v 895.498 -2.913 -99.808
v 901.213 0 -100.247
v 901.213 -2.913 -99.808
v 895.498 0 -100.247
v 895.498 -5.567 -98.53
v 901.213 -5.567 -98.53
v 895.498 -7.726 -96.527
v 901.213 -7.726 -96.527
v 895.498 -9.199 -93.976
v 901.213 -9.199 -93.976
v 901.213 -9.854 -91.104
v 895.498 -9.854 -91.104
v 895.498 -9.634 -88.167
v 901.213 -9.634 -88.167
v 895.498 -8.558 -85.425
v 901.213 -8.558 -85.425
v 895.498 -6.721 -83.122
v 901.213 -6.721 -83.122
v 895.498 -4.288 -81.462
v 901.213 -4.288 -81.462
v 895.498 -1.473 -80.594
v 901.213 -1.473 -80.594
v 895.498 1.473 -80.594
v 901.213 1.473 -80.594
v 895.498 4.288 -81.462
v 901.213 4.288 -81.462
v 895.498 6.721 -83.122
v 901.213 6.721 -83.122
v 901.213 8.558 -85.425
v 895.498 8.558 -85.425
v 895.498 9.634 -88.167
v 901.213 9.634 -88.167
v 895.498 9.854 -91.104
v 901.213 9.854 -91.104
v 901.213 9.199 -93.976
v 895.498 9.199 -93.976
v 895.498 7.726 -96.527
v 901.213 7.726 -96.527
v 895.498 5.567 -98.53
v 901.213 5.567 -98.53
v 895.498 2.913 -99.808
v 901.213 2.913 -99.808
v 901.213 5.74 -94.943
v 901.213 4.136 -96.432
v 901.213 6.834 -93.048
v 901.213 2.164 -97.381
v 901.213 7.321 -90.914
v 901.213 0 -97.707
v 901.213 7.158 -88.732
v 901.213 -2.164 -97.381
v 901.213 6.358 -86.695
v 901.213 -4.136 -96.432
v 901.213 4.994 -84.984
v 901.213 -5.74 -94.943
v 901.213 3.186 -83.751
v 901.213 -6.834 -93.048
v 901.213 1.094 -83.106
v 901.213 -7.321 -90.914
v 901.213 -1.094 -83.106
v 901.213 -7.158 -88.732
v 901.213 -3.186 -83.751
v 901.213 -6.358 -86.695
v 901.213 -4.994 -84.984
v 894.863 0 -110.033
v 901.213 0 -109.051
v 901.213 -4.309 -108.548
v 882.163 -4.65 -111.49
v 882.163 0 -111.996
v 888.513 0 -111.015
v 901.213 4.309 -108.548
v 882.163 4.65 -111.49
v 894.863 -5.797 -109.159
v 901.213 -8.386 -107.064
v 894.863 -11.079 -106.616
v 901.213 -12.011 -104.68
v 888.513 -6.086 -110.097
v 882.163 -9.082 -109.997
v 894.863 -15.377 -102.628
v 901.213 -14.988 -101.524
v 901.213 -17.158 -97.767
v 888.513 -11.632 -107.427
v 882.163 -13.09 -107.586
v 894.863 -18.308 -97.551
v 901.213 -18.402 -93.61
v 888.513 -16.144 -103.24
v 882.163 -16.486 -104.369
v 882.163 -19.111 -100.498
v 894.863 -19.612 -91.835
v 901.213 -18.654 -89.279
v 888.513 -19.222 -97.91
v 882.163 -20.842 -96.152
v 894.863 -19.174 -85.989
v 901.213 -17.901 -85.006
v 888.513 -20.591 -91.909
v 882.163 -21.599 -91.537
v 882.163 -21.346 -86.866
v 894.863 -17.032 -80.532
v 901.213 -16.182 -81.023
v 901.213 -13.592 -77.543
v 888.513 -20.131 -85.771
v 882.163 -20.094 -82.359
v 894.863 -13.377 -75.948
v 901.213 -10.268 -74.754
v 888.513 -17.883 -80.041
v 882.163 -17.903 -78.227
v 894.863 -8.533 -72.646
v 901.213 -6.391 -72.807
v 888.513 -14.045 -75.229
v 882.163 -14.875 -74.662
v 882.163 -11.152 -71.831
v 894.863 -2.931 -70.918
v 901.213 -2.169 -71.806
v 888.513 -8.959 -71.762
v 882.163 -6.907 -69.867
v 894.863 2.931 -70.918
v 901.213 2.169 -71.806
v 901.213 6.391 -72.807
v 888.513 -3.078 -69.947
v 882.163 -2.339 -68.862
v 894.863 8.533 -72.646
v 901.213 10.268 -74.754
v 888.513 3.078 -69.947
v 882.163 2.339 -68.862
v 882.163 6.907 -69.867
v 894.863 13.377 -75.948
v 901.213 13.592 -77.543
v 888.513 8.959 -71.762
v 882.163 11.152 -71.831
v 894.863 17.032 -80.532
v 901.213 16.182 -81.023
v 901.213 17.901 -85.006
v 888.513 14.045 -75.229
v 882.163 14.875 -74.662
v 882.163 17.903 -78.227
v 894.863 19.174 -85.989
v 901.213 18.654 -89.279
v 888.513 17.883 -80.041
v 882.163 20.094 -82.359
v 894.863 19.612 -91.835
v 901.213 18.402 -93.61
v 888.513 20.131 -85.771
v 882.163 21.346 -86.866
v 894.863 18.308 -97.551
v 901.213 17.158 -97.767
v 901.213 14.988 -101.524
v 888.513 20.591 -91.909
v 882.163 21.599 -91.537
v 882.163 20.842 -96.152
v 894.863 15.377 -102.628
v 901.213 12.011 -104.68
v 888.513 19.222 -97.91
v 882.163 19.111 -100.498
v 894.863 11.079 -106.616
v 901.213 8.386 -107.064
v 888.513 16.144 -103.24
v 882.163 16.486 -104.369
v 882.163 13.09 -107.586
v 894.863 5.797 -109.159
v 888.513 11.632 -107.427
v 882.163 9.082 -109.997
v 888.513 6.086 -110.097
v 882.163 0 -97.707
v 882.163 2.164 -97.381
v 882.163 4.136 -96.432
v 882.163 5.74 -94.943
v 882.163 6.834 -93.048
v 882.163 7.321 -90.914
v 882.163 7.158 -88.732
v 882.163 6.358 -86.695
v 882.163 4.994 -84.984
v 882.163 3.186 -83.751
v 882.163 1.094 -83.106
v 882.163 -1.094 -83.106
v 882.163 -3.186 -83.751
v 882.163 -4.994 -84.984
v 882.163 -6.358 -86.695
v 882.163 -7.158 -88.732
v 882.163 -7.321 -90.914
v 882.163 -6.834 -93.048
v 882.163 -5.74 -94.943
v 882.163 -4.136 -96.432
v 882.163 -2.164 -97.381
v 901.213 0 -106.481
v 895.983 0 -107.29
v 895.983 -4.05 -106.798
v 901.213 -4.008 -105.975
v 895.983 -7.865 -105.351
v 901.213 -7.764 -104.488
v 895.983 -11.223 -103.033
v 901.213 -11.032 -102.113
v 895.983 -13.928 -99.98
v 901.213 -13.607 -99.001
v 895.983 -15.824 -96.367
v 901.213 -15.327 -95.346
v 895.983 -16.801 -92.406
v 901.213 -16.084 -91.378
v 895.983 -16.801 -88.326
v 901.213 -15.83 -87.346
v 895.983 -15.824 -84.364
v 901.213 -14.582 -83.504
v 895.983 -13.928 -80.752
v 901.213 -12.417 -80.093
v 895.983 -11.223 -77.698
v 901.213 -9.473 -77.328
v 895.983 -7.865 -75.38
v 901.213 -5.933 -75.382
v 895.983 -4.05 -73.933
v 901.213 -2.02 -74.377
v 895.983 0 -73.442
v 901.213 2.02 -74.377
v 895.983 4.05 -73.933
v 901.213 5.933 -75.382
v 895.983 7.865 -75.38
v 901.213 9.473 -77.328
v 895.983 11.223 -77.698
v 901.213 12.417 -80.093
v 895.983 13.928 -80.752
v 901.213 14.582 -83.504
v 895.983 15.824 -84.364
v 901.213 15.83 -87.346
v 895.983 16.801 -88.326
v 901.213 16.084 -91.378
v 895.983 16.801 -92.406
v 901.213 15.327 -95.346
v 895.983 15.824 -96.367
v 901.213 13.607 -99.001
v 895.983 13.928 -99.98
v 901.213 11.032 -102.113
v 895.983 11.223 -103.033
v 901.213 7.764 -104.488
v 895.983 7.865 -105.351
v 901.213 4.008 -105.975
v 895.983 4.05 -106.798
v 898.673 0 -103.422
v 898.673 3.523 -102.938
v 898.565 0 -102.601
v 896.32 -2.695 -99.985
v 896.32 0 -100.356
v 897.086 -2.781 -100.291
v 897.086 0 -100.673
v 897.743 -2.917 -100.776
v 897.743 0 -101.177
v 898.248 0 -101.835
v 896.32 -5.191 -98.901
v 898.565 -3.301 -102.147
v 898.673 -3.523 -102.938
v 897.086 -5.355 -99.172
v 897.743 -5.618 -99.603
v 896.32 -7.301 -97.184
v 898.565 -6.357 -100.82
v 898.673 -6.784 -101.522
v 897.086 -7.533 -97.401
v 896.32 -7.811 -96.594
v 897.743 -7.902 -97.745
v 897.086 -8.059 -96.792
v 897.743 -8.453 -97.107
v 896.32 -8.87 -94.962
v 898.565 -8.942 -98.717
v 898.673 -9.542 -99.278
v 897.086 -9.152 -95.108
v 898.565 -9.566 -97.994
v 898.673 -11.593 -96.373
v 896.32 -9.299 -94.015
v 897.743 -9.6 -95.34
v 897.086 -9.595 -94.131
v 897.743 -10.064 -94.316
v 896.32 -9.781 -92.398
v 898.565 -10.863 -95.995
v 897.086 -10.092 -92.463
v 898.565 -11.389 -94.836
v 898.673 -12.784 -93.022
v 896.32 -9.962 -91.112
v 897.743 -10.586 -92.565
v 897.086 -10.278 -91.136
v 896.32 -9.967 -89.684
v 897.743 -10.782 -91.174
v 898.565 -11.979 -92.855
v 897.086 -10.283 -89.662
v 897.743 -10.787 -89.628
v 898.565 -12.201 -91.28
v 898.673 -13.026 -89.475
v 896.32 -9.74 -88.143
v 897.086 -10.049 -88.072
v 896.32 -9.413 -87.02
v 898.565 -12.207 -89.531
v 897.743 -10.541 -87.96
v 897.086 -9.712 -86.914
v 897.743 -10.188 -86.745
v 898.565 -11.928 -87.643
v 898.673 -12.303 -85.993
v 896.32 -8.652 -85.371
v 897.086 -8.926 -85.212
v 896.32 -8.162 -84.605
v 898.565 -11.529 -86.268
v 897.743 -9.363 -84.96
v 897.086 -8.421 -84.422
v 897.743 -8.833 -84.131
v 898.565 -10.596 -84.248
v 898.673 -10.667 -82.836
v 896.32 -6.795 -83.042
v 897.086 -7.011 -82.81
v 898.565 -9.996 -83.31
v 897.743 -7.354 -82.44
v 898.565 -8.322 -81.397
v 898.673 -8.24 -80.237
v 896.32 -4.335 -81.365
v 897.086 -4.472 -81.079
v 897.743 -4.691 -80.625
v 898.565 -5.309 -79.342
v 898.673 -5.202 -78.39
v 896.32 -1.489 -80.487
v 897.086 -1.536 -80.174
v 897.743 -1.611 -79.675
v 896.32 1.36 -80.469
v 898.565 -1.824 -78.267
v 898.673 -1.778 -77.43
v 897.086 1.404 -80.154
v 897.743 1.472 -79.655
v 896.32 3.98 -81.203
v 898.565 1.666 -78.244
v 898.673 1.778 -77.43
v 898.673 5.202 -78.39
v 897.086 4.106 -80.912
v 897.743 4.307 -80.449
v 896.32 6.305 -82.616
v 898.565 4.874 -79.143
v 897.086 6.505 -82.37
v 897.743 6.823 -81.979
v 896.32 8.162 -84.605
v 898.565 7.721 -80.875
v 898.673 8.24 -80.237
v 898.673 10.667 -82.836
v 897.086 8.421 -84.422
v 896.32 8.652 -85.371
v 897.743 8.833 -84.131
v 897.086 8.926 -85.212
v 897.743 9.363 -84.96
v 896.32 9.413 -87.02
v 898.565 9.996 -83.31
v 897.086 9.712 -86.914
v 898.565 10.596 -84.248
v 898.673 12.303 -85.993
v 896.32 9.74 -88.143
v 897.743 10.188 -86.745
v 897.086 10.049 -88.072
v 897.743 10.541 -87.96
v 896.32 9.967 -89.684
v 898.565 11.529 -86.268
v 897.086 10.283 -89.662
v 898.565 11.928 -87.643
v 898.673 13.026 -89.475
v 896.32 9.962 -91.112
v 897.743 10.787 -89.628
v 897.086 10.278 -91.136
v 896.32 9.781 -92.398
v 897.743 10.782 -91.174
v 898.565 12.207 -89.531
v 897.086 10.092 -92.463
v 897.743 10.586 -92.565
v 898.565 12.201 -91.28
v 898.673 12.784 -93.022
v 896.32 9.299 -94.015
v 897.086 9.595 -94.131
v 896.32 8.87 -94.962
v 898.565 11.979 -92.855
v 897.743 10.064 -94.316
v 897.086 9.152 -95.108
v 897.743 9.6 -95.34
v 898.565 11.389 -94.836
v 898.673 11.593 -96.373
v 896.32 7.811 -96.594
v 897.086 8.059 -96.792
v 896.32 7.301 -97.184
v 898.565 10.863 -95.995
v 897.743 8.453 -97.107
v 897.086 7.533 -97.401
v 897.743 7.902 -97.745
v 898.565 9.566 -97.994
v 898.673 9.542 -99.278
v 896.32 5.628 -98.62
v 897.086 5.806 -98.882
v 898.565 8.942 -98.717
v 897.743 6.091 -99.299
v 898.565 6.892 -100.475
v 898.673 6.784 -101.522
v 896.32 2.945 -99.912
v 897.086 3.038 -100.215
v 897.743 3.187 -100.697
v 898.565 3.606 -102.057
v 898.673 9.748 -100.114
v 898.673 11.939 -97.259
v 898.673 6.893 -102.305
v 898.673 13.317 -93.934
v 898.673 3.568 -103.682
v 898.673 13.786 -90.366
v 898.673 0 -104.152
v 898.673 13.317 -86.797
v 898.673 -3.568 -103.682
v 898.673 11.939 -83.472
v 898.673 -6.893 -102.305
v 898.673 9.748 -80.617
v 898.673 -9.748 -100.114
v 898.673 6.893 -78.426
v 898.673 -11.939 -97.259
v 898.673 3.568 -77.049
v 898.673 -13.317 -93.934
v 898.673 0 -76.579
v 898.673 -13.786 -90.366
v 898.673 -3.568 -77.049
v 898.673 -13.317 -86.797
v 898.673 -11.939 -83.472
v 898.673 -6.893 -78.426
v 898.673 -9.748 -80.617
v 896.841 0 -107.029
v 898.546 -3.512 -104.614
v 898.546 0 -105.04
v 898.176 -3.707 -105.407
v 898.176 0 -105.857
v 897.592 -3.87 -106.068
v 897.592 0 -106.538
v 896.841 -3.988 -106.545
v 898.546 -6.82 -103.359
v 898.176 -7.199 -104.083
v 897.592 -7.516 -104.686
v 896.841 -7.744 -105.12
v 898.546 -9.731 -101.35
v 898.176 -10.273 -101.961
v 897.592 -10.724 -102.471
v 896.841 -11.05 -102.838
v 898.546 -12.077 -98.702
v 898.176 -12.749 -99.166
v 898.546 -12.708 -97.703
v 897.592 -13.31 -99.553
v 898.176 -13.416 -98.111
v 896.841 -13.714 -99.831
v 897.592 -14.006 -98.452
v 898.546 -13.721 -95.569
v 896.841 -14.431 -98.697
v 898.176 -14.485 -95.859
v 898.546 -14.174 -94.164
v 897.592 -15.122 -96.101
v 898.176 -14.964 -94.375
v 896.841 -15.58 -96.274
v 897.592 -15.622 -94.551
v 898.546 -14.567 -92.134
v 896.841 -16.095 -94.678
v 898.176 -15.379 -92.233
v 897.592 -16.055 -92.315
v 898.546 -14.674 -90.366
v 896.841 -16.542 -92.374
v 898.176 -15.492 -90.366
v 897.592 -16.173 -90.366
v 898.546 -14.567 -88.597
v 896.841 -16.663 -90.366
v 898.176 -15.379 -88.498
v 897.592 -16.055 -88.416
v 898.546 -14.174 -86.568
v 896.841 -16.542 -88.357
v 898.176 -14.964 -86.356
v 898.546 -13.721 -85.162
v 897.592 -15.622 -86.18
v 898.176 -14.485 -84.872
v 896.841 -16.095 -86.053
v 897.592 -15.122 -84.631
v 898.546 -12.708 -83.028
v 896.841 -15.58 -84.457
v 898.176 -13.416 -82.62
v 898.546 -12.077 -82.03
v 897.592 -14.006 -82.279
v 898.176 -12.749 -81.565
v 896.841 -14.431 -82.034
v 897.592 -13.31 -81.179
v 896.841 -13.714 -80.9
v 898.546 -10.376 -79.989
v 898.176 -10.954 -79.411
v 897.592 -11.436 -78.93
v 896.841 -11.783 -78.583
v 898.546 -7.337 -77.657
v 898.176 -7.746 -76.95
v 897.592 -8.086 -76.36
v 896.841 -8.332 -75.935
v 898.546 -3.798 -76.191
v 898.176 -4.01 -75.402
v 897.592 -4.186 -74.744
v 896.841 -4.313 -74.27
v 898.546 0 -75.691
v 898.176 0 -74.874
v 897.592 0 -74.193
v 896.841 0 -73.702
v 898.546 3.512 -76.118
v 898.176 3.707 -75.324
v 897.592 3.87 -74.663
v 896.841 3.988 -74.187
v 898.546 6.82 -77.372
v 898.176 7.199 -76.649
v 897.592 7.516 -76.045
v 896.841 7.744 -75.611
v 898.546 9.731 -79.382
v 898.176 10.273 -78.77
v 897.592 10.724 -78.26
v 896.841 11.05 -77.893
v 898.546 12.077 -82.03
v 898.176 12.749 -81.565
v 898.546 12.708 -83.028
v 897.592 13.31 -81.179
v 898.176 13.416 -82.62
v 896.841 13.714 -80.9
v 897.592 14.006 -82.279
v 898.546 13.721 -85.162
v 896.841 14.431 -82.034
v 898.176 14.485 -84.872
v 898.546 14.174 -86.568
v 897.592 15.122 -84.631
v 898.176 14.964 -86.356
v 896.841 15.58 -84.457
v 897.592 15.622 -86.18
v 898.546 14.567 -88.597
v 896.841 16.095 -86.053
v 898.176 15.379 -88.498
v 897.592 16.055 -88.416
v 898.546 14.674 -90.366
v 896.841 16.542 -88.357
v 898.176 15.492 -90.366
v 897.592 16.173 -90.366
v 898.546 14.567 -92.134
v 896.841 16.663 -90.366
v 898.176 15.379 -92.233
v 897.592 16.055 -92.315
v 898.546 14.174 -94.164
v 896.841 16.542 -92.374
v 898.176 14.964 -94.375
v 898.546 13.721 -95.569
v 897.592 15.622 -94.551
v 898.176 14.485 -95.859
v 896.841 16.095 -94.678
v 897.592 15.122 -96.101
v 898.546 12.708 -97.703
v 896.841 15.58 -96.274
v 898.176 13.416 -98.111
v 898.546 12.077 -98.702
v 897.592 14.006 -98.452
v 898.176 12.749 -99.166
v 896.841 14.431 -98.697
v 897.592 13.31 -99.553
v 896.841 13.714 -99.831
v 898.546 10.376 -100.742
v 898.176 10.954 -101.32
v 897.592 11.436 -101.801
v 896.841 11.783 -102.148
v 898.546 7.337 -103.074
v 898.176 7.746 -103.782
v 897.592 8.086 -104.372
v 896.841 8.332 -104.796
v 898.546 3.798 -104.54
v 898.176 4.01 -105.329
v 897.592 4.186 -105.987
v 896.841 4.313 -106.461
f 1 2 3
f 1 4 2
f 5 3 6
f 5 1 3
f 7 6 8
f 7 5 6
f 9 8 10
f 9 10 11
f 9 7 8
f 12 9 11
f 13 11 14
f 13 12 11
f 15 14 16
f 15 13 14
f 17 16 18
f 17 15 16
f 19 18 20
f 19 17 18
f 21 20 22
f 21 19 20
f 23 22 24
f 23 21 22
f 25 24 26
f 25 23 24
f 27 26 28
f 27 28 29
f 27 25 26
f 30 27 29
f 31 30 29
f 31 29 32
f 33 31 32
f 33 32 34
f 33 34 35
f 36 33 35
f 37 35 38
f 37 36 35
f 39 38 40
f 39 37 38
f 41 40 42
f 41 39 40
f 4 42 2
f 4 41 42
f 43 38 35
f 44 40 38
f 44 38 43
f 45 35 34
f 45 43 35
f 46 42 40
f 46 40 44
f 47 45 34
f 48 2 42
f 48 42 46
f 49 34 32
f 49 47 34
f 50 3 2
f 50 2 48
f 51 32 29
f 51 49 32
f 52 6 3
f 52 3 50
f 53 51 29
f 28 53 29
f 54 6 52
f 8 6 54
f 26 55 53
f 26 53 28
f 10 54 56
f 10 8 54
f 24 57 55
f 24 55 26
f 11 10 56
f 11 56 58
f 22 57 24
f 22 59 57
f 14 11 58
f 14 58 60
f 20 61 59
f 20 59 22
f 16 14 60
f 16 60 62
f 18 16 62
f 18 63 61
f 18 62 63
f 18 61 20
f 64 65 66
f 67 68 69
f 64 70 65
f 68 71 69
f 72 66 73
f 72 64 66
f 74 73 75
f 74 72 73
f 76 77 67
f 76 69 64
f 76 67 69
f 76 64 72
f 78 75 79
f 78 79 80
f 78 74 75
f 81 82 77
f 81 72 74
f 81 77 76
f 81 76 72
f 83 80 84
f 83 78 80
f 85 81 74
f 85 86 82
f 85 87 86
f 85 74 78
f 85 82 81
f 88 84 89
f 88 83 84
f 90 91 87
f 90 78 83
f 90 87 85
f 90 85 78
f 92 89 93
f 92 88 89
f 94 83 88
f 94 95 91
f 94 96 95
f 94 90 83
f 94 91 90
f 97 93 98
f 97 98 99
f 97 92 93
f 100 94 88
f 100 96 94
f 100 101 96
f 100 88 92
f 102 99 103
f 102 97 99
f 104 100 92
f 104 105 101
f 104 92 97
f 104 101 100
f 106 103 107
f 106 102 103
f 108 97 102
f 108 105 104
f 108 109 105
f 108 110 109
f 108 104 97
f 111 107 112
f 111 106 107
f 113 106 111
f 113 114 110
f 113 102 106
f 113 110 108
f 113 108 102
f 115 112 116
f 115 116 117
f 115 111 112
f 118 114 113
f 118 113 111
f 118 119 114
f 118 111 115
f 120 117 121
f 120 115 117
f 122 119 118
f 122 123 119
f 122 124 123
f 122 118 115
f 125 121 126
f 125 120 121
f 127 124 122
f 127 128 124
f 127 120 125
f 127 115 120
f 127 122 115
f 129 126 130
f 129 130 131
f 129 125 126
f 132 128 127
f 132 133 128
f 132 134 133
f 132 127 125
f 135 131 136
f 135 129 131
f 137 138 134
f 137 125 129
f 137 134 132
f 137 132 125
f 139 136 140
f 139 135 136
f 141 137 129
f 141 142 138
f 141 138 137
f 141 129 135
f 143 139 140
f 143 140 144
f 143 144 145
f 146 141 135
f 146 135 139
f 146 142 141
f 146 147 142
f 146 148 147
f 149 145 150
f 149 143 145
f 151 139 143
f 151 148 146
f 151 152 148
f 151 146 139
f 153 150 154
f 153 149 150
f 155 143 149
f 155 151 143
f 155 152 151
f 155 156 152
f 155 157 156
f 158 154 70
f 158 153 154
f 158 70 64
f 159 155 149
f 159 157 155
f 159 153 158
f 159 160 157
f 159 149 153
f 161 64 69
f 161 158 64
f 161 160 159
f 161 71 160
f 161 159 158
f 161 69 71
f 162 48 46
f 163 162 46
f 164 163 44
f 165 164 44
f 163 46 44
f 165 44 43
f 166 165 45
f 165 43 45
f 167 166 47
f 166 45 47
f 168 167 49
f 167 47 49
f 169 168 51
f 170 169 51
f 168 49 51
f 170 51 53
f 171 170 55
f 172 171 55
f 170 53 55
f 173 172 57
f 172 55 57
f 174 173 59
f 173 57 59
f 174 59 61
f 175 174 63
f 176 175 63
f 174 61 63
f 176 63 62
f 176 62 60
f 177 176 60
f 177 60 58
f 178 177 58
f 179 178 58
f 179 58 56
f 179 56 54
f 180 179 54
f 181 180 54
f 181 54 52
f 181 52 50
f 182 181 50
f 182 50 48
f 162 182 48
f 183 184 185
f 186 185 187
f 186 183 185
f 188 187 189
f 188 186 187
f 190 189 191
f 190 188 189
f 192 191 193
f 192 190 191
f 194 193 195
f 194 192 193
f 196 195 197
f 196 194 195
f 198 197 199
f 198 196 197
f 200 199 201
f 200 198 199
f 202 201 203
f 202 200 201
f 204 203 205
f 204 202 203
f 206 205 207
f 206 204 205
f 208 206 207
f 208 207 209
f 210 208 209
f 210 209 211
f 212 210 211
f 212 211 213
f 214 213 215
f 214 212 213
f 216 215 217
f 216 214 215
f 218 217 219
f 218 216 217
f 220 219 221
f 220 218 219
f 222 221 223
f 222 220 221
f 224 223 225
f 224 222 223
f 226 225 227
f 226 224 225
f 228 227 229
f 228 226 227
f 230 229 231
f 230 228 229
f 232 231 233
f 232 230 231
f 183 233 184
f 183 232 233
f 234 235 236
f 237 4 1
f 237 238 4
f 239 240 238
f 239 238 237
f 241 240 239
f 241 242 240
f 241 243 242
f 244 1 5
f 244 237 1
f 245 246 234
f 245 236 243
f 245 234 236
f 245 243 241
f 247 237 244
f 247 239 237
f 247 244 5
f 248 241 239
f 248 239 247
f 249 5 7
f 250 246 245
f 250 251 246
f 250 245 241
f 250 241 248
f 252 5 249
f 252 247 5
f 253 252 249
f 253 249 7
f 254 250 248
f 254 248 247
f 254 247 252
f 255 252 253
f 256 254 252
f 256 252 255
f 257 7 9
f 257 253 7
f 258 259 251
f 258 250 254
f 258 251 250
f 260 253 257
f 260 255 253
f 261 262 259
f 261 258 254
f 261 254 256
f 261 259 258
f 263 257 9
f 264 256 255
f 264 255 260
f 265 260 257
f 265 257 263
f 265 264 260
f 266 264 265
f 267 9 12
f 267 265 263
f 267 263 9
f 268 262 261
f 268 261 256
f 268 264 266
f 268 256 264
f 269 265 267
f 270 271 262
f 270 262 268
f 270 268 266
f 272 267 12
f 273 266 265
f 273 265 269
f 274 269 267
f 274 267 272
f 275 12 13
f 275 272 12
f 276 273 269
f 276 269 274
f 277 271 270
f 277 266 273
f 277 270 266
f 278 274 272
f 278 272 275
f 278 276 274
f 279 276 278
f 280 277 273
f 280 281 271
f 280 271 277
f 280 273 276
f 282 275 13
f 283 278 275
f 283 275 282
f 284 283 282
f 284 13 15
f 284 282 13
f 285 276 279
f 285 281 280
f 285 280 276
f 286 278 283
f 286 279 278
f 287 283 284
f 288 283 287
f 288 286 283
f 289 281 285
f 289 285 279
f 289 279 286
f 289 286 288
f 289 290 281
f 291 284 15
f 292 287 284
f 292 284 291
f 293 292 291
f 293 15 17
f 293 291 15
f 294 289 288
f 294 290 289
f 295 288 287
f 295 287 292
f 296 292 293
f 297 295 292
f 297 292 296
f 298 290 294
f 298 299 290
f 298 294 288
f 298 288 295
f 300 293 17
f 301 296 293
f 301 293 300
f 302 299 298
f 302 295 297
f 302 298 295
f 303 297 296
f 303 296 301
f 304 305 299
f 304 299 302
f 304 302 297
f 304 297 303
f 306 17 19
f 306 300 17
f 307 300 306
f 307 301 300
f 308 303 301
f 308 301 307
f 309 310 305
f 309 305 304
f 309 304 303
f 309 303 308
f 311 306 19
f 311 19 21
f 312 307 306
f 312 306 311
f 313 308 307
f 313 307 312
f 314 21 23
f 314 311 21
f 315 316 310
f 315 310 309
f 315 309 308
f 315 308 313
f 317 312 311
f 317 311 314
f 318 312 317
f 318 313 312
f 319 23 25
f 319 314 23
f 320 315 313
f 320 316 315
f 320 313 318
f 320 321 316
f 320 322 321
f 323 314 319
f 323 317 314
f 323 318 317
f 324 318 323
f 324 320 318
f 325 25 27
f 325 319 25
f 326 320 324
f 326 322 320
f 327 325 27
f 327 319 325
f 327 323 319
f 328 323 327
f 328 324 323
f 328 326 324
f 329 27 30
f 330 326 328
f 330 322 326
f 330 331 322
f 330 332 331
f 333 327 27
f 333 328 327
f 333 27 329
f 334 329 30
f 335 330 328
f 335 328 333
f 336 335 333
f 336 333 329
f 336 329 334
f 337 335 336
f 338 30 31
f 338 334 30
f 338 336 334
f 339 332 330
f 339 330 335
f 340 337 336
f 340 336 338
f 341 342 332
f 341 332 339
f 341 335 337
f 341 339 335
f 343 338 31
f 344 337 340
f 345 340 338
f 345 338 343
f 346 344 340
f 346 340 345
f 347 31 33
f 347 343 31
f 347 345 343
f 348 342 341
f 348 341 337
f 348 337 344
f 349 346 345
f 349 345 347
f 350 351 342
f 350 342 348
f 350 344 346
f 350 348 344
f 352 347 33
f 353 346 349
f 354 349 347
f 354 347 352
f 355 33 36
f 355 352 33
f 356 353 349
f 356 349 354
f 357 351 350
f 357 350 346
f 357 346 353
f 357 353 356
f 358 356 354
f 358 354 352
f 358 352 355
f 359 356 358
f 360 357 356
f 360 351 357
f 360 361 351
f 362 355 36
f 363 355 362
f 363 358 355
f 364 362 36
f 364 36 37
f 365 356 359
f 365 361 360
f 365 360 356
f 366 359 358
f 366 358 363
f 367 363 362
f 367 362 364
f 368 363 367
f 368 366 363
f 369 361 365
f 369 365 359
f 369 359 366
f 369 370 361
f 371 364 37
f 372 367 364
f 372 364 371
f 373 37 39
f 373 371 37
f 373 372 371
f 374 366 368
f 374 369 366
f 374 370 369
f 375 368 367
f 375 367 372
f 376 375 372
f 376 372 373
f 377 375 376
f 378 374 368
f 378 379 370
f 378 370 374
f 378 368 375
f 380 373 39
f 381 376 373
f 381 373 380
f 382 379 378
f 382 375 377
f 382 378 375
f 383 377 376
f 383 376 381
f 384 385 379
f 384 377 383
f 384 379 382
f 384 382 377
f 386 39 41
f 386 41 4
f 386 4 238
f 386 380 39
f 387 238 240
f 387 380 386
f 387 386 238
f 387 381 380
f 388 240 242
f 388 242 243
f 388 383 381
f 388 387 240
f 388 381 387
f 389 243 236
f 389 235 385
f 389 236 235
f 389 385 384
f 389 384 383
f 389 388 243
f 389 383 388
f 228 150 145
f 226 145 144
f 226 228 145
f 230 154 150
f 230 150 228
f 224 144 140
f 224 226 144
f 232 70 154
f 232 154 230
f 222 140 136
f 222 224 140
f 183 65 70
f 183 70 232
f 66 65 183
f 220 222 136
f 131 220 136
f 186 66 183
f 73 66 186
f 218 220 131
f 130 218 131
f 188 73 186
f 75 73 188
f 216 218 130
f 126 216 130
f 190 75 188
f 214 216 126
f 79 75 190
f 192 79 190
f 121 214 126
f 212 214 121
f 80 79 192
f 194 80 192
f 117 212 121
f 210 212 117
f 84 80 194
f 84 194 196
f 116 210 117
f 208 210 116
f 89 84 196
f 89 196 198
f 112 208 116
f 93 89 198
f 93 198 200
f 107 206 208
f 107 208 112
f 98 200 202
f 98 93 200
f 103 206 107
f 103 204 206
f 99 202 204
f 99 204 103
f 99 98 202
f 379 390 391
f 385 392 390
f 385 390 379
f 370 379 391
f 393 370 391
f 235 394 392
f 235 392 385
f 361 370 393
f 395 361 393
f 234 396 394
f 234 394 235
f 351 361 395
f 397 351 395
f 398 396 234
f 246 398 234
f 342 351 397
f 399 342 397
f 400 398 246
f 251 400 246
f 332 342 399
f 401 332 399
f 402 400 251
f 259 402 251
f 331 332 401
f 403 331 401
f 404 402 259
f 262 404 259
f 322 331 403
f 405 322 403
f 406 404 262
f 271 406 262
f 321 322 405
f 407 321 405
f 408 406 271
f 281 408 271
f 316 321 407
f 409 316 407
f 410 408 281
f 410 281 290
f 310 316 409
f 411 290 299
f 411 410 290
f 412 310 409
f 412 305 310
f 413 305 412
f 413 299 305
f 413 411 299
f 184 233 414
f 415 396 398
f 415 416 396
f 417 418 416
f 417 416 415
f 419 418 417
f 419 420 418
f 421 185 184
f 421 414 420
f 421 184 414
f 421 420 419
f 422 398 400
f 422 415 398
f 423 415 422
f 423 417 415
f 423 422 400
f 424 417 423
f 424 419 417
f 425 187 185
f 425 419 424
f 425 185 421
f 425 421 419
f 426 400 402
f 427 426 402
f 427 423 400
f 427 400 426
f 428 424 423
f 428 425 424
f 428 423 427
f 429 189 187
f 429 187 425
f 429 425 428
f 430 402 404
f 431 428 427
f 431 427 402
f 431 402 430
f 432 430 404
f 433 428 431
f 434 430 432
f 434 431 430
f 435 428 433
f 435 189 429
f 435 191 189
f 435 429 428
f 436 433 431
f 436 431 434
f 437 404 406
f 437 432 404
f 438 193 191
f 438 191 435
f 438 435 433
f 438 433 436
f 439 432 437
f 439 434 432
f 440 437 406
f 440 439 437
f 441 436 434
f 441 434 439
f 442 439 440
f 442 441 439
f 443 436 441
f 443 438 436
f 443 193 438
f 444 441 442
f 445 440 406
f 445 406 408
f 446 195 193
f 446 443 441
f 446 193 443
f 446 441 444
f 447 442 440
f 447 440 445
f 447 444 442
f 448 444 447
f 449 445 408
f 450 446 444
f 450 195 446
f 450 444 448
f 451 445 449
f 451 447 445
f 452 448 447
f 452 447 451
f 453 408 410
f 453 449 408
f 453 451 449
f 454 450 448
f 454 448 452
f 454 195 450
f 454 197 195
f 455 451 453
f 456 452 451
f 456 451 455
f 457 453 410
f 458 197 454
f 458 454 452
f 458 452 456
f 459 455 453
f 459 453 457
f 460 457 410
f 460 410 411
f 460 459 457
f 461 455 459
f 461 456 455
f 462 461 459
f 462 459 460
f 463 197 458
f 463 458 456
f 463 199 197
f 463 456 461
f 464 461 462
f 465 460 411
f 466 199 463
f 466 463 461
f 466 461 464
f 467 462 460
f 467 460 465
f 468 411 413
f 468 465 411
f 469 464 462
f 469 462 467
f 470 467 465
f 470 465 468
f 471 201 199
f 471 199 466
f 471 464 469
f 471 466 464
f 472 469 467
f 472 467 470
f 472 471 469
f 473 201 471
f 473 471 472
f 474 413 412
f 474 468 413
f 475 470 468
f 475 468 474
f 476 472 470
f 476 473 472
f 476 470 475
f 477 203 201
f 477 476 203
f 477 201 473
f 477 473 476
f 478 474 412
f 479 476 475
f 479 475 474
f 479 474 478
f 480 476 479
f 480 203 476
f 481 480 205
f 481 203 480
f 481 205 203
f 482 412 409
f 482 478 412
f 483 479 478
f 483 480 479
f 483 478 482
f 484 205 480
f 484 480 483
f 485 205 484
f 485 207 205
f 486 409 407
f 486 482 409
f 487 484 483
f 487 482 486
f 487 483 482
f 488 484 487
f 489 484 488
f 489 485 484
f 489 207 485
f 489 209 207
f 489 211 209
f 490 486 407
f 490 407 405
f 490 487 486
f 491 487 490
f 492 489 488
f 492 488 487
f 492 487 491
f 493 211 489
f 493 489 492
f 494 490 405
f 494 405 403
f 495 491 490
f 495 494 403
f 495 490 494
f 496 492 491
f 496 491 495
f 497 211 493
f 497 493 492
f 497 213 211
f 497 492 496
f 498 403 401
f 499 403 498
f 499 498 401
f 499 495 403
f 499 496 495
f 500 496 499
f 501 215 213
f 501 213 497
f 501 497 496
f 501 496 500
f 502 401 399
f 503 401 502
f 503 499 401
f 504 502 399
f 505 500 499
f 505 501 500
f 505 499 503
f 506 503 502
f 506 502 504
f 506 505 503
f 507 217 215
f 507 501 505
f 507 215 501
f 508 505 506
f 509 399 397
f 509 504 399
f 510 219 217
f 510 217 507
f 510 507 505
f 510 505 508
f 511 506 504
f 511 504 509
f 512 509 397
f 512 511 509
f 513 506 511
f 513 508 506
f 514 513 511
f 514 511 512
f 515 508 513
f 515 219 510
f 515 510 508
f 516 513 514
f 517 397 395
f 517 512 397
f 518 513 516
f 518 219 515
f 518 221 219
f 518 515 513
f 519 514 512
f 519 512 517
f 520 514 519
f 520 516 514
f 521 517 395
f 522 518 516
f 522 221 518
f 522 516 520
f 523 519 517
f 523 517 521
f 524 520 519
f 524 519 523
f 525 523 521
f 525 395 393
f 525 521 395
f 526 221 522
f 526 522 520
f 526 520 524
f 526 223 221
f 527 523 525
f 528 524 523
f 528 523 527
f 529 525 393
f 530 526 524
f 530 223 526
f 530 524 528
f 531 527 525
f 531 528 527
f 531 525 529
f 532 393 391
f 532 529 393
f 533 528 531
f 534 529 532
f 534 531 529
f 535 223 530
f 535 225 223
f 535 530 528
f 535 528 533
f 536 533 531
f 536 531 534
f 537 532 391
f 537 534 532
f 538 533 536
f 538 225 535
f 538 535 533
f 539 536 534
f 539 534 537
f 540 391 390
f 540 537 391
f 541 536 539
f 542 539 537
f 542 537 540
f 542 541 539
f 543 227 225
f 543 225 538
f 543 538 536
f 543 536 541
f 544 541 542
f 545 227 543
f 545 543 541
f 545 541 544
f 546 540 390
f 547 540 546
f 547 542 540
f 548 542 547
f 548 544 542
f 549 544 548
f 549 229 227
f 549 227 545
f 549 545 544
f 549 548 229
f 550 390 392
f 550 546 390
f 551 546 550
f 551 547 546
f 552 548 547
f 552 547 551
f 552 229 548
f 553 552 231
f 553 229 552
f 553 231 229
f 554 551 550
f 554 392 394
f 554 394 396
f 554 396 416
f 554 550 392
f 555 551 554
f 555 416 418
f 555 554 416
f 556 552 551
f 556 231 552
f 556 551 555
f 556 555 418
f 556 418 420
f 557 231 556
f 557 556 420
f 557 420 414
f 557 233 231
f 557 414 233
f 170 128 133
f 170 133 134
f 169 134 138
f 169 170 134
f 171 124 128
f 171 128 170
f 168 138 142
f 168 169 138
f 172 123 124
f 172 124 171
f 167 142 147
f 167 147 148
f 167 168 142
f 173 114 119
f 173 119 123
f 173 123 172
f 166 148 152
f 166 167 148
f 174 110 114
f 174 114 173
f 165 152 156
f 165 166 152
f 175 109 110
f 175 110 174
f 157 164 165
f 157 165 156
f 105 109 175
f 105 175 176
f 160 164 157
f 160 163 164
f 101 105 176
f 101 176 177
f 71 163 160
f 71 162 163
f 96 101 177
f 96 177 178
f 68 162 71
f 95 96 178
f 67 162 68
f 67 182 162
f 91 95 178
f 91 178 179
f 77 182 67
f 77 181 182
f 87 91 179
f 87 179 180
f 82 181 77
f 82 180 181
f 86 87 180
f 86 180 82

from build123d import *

# Parameters (mm, degrees)
TAPPED_HOLE_FOR_9_16_12_HELICOIL1_D = 14.68374


with BuildPart() as part:
    # Sketch1 → Revolve2 (revolve)
    with BuildSketch(Plane(origin=(0, 0, 0), x_dir=(1, 0, 0), z_dir=(0, 1, 0))):
        Polygon((882.163023054, 111.99614411), (882.163023054, 90.365625069), (901.213023054, 90.365625069), (901.213023054, 109.051426841), align=None)
    revolve(axis=Axis((1002.111866296, 0, -90.365625069), (-1, 0, 0)))

    # Tapped Hole for 9/16-12 Helicoil1 (through all)
    with Locations(Plane.ZY.offset(-882.163023054)):
        with Locations((-90.365625069, 0)):
            Hole(TAPPED_HOLE_FOR_9_16_12_HELICOIL1_D / 2)

    # Sketch5 → Cut-Revolve1 (revolve, cut)
    with BuildSketch(Plane(origin=(0, 0, 0), x_dir=(1, 0, 0), z_dir=(0, 1, 0))):
        with BuildLine():
            Line((928.636701013, 102.242153557), (928.636701013, 100.247495069))
            Line((928.636701013, 100.247495069), (895.498023054, 100.247495069))
            ThreePointArc((895.498023054, 100.247495069), (897.743087084, 101.177431039), (898.673023054, 103.422495069))
            Line((898.673023054, 103.422495069), (898.673023054, 104.151966666))
            ThreePointArc((898.673023054, 104.151966666), (897.908477535, 106.21844536), (895.983048759, 107.289700731))
            Line((895.983048759, 107.289700731), (928.636701013, 102.242153557))
        make_face()
    revolve(axis=Axis((1002.111866296, 0, -90.365625069), (-1, 0, 0)), mode=Mode.SUBTRACT)


solid = part.part
